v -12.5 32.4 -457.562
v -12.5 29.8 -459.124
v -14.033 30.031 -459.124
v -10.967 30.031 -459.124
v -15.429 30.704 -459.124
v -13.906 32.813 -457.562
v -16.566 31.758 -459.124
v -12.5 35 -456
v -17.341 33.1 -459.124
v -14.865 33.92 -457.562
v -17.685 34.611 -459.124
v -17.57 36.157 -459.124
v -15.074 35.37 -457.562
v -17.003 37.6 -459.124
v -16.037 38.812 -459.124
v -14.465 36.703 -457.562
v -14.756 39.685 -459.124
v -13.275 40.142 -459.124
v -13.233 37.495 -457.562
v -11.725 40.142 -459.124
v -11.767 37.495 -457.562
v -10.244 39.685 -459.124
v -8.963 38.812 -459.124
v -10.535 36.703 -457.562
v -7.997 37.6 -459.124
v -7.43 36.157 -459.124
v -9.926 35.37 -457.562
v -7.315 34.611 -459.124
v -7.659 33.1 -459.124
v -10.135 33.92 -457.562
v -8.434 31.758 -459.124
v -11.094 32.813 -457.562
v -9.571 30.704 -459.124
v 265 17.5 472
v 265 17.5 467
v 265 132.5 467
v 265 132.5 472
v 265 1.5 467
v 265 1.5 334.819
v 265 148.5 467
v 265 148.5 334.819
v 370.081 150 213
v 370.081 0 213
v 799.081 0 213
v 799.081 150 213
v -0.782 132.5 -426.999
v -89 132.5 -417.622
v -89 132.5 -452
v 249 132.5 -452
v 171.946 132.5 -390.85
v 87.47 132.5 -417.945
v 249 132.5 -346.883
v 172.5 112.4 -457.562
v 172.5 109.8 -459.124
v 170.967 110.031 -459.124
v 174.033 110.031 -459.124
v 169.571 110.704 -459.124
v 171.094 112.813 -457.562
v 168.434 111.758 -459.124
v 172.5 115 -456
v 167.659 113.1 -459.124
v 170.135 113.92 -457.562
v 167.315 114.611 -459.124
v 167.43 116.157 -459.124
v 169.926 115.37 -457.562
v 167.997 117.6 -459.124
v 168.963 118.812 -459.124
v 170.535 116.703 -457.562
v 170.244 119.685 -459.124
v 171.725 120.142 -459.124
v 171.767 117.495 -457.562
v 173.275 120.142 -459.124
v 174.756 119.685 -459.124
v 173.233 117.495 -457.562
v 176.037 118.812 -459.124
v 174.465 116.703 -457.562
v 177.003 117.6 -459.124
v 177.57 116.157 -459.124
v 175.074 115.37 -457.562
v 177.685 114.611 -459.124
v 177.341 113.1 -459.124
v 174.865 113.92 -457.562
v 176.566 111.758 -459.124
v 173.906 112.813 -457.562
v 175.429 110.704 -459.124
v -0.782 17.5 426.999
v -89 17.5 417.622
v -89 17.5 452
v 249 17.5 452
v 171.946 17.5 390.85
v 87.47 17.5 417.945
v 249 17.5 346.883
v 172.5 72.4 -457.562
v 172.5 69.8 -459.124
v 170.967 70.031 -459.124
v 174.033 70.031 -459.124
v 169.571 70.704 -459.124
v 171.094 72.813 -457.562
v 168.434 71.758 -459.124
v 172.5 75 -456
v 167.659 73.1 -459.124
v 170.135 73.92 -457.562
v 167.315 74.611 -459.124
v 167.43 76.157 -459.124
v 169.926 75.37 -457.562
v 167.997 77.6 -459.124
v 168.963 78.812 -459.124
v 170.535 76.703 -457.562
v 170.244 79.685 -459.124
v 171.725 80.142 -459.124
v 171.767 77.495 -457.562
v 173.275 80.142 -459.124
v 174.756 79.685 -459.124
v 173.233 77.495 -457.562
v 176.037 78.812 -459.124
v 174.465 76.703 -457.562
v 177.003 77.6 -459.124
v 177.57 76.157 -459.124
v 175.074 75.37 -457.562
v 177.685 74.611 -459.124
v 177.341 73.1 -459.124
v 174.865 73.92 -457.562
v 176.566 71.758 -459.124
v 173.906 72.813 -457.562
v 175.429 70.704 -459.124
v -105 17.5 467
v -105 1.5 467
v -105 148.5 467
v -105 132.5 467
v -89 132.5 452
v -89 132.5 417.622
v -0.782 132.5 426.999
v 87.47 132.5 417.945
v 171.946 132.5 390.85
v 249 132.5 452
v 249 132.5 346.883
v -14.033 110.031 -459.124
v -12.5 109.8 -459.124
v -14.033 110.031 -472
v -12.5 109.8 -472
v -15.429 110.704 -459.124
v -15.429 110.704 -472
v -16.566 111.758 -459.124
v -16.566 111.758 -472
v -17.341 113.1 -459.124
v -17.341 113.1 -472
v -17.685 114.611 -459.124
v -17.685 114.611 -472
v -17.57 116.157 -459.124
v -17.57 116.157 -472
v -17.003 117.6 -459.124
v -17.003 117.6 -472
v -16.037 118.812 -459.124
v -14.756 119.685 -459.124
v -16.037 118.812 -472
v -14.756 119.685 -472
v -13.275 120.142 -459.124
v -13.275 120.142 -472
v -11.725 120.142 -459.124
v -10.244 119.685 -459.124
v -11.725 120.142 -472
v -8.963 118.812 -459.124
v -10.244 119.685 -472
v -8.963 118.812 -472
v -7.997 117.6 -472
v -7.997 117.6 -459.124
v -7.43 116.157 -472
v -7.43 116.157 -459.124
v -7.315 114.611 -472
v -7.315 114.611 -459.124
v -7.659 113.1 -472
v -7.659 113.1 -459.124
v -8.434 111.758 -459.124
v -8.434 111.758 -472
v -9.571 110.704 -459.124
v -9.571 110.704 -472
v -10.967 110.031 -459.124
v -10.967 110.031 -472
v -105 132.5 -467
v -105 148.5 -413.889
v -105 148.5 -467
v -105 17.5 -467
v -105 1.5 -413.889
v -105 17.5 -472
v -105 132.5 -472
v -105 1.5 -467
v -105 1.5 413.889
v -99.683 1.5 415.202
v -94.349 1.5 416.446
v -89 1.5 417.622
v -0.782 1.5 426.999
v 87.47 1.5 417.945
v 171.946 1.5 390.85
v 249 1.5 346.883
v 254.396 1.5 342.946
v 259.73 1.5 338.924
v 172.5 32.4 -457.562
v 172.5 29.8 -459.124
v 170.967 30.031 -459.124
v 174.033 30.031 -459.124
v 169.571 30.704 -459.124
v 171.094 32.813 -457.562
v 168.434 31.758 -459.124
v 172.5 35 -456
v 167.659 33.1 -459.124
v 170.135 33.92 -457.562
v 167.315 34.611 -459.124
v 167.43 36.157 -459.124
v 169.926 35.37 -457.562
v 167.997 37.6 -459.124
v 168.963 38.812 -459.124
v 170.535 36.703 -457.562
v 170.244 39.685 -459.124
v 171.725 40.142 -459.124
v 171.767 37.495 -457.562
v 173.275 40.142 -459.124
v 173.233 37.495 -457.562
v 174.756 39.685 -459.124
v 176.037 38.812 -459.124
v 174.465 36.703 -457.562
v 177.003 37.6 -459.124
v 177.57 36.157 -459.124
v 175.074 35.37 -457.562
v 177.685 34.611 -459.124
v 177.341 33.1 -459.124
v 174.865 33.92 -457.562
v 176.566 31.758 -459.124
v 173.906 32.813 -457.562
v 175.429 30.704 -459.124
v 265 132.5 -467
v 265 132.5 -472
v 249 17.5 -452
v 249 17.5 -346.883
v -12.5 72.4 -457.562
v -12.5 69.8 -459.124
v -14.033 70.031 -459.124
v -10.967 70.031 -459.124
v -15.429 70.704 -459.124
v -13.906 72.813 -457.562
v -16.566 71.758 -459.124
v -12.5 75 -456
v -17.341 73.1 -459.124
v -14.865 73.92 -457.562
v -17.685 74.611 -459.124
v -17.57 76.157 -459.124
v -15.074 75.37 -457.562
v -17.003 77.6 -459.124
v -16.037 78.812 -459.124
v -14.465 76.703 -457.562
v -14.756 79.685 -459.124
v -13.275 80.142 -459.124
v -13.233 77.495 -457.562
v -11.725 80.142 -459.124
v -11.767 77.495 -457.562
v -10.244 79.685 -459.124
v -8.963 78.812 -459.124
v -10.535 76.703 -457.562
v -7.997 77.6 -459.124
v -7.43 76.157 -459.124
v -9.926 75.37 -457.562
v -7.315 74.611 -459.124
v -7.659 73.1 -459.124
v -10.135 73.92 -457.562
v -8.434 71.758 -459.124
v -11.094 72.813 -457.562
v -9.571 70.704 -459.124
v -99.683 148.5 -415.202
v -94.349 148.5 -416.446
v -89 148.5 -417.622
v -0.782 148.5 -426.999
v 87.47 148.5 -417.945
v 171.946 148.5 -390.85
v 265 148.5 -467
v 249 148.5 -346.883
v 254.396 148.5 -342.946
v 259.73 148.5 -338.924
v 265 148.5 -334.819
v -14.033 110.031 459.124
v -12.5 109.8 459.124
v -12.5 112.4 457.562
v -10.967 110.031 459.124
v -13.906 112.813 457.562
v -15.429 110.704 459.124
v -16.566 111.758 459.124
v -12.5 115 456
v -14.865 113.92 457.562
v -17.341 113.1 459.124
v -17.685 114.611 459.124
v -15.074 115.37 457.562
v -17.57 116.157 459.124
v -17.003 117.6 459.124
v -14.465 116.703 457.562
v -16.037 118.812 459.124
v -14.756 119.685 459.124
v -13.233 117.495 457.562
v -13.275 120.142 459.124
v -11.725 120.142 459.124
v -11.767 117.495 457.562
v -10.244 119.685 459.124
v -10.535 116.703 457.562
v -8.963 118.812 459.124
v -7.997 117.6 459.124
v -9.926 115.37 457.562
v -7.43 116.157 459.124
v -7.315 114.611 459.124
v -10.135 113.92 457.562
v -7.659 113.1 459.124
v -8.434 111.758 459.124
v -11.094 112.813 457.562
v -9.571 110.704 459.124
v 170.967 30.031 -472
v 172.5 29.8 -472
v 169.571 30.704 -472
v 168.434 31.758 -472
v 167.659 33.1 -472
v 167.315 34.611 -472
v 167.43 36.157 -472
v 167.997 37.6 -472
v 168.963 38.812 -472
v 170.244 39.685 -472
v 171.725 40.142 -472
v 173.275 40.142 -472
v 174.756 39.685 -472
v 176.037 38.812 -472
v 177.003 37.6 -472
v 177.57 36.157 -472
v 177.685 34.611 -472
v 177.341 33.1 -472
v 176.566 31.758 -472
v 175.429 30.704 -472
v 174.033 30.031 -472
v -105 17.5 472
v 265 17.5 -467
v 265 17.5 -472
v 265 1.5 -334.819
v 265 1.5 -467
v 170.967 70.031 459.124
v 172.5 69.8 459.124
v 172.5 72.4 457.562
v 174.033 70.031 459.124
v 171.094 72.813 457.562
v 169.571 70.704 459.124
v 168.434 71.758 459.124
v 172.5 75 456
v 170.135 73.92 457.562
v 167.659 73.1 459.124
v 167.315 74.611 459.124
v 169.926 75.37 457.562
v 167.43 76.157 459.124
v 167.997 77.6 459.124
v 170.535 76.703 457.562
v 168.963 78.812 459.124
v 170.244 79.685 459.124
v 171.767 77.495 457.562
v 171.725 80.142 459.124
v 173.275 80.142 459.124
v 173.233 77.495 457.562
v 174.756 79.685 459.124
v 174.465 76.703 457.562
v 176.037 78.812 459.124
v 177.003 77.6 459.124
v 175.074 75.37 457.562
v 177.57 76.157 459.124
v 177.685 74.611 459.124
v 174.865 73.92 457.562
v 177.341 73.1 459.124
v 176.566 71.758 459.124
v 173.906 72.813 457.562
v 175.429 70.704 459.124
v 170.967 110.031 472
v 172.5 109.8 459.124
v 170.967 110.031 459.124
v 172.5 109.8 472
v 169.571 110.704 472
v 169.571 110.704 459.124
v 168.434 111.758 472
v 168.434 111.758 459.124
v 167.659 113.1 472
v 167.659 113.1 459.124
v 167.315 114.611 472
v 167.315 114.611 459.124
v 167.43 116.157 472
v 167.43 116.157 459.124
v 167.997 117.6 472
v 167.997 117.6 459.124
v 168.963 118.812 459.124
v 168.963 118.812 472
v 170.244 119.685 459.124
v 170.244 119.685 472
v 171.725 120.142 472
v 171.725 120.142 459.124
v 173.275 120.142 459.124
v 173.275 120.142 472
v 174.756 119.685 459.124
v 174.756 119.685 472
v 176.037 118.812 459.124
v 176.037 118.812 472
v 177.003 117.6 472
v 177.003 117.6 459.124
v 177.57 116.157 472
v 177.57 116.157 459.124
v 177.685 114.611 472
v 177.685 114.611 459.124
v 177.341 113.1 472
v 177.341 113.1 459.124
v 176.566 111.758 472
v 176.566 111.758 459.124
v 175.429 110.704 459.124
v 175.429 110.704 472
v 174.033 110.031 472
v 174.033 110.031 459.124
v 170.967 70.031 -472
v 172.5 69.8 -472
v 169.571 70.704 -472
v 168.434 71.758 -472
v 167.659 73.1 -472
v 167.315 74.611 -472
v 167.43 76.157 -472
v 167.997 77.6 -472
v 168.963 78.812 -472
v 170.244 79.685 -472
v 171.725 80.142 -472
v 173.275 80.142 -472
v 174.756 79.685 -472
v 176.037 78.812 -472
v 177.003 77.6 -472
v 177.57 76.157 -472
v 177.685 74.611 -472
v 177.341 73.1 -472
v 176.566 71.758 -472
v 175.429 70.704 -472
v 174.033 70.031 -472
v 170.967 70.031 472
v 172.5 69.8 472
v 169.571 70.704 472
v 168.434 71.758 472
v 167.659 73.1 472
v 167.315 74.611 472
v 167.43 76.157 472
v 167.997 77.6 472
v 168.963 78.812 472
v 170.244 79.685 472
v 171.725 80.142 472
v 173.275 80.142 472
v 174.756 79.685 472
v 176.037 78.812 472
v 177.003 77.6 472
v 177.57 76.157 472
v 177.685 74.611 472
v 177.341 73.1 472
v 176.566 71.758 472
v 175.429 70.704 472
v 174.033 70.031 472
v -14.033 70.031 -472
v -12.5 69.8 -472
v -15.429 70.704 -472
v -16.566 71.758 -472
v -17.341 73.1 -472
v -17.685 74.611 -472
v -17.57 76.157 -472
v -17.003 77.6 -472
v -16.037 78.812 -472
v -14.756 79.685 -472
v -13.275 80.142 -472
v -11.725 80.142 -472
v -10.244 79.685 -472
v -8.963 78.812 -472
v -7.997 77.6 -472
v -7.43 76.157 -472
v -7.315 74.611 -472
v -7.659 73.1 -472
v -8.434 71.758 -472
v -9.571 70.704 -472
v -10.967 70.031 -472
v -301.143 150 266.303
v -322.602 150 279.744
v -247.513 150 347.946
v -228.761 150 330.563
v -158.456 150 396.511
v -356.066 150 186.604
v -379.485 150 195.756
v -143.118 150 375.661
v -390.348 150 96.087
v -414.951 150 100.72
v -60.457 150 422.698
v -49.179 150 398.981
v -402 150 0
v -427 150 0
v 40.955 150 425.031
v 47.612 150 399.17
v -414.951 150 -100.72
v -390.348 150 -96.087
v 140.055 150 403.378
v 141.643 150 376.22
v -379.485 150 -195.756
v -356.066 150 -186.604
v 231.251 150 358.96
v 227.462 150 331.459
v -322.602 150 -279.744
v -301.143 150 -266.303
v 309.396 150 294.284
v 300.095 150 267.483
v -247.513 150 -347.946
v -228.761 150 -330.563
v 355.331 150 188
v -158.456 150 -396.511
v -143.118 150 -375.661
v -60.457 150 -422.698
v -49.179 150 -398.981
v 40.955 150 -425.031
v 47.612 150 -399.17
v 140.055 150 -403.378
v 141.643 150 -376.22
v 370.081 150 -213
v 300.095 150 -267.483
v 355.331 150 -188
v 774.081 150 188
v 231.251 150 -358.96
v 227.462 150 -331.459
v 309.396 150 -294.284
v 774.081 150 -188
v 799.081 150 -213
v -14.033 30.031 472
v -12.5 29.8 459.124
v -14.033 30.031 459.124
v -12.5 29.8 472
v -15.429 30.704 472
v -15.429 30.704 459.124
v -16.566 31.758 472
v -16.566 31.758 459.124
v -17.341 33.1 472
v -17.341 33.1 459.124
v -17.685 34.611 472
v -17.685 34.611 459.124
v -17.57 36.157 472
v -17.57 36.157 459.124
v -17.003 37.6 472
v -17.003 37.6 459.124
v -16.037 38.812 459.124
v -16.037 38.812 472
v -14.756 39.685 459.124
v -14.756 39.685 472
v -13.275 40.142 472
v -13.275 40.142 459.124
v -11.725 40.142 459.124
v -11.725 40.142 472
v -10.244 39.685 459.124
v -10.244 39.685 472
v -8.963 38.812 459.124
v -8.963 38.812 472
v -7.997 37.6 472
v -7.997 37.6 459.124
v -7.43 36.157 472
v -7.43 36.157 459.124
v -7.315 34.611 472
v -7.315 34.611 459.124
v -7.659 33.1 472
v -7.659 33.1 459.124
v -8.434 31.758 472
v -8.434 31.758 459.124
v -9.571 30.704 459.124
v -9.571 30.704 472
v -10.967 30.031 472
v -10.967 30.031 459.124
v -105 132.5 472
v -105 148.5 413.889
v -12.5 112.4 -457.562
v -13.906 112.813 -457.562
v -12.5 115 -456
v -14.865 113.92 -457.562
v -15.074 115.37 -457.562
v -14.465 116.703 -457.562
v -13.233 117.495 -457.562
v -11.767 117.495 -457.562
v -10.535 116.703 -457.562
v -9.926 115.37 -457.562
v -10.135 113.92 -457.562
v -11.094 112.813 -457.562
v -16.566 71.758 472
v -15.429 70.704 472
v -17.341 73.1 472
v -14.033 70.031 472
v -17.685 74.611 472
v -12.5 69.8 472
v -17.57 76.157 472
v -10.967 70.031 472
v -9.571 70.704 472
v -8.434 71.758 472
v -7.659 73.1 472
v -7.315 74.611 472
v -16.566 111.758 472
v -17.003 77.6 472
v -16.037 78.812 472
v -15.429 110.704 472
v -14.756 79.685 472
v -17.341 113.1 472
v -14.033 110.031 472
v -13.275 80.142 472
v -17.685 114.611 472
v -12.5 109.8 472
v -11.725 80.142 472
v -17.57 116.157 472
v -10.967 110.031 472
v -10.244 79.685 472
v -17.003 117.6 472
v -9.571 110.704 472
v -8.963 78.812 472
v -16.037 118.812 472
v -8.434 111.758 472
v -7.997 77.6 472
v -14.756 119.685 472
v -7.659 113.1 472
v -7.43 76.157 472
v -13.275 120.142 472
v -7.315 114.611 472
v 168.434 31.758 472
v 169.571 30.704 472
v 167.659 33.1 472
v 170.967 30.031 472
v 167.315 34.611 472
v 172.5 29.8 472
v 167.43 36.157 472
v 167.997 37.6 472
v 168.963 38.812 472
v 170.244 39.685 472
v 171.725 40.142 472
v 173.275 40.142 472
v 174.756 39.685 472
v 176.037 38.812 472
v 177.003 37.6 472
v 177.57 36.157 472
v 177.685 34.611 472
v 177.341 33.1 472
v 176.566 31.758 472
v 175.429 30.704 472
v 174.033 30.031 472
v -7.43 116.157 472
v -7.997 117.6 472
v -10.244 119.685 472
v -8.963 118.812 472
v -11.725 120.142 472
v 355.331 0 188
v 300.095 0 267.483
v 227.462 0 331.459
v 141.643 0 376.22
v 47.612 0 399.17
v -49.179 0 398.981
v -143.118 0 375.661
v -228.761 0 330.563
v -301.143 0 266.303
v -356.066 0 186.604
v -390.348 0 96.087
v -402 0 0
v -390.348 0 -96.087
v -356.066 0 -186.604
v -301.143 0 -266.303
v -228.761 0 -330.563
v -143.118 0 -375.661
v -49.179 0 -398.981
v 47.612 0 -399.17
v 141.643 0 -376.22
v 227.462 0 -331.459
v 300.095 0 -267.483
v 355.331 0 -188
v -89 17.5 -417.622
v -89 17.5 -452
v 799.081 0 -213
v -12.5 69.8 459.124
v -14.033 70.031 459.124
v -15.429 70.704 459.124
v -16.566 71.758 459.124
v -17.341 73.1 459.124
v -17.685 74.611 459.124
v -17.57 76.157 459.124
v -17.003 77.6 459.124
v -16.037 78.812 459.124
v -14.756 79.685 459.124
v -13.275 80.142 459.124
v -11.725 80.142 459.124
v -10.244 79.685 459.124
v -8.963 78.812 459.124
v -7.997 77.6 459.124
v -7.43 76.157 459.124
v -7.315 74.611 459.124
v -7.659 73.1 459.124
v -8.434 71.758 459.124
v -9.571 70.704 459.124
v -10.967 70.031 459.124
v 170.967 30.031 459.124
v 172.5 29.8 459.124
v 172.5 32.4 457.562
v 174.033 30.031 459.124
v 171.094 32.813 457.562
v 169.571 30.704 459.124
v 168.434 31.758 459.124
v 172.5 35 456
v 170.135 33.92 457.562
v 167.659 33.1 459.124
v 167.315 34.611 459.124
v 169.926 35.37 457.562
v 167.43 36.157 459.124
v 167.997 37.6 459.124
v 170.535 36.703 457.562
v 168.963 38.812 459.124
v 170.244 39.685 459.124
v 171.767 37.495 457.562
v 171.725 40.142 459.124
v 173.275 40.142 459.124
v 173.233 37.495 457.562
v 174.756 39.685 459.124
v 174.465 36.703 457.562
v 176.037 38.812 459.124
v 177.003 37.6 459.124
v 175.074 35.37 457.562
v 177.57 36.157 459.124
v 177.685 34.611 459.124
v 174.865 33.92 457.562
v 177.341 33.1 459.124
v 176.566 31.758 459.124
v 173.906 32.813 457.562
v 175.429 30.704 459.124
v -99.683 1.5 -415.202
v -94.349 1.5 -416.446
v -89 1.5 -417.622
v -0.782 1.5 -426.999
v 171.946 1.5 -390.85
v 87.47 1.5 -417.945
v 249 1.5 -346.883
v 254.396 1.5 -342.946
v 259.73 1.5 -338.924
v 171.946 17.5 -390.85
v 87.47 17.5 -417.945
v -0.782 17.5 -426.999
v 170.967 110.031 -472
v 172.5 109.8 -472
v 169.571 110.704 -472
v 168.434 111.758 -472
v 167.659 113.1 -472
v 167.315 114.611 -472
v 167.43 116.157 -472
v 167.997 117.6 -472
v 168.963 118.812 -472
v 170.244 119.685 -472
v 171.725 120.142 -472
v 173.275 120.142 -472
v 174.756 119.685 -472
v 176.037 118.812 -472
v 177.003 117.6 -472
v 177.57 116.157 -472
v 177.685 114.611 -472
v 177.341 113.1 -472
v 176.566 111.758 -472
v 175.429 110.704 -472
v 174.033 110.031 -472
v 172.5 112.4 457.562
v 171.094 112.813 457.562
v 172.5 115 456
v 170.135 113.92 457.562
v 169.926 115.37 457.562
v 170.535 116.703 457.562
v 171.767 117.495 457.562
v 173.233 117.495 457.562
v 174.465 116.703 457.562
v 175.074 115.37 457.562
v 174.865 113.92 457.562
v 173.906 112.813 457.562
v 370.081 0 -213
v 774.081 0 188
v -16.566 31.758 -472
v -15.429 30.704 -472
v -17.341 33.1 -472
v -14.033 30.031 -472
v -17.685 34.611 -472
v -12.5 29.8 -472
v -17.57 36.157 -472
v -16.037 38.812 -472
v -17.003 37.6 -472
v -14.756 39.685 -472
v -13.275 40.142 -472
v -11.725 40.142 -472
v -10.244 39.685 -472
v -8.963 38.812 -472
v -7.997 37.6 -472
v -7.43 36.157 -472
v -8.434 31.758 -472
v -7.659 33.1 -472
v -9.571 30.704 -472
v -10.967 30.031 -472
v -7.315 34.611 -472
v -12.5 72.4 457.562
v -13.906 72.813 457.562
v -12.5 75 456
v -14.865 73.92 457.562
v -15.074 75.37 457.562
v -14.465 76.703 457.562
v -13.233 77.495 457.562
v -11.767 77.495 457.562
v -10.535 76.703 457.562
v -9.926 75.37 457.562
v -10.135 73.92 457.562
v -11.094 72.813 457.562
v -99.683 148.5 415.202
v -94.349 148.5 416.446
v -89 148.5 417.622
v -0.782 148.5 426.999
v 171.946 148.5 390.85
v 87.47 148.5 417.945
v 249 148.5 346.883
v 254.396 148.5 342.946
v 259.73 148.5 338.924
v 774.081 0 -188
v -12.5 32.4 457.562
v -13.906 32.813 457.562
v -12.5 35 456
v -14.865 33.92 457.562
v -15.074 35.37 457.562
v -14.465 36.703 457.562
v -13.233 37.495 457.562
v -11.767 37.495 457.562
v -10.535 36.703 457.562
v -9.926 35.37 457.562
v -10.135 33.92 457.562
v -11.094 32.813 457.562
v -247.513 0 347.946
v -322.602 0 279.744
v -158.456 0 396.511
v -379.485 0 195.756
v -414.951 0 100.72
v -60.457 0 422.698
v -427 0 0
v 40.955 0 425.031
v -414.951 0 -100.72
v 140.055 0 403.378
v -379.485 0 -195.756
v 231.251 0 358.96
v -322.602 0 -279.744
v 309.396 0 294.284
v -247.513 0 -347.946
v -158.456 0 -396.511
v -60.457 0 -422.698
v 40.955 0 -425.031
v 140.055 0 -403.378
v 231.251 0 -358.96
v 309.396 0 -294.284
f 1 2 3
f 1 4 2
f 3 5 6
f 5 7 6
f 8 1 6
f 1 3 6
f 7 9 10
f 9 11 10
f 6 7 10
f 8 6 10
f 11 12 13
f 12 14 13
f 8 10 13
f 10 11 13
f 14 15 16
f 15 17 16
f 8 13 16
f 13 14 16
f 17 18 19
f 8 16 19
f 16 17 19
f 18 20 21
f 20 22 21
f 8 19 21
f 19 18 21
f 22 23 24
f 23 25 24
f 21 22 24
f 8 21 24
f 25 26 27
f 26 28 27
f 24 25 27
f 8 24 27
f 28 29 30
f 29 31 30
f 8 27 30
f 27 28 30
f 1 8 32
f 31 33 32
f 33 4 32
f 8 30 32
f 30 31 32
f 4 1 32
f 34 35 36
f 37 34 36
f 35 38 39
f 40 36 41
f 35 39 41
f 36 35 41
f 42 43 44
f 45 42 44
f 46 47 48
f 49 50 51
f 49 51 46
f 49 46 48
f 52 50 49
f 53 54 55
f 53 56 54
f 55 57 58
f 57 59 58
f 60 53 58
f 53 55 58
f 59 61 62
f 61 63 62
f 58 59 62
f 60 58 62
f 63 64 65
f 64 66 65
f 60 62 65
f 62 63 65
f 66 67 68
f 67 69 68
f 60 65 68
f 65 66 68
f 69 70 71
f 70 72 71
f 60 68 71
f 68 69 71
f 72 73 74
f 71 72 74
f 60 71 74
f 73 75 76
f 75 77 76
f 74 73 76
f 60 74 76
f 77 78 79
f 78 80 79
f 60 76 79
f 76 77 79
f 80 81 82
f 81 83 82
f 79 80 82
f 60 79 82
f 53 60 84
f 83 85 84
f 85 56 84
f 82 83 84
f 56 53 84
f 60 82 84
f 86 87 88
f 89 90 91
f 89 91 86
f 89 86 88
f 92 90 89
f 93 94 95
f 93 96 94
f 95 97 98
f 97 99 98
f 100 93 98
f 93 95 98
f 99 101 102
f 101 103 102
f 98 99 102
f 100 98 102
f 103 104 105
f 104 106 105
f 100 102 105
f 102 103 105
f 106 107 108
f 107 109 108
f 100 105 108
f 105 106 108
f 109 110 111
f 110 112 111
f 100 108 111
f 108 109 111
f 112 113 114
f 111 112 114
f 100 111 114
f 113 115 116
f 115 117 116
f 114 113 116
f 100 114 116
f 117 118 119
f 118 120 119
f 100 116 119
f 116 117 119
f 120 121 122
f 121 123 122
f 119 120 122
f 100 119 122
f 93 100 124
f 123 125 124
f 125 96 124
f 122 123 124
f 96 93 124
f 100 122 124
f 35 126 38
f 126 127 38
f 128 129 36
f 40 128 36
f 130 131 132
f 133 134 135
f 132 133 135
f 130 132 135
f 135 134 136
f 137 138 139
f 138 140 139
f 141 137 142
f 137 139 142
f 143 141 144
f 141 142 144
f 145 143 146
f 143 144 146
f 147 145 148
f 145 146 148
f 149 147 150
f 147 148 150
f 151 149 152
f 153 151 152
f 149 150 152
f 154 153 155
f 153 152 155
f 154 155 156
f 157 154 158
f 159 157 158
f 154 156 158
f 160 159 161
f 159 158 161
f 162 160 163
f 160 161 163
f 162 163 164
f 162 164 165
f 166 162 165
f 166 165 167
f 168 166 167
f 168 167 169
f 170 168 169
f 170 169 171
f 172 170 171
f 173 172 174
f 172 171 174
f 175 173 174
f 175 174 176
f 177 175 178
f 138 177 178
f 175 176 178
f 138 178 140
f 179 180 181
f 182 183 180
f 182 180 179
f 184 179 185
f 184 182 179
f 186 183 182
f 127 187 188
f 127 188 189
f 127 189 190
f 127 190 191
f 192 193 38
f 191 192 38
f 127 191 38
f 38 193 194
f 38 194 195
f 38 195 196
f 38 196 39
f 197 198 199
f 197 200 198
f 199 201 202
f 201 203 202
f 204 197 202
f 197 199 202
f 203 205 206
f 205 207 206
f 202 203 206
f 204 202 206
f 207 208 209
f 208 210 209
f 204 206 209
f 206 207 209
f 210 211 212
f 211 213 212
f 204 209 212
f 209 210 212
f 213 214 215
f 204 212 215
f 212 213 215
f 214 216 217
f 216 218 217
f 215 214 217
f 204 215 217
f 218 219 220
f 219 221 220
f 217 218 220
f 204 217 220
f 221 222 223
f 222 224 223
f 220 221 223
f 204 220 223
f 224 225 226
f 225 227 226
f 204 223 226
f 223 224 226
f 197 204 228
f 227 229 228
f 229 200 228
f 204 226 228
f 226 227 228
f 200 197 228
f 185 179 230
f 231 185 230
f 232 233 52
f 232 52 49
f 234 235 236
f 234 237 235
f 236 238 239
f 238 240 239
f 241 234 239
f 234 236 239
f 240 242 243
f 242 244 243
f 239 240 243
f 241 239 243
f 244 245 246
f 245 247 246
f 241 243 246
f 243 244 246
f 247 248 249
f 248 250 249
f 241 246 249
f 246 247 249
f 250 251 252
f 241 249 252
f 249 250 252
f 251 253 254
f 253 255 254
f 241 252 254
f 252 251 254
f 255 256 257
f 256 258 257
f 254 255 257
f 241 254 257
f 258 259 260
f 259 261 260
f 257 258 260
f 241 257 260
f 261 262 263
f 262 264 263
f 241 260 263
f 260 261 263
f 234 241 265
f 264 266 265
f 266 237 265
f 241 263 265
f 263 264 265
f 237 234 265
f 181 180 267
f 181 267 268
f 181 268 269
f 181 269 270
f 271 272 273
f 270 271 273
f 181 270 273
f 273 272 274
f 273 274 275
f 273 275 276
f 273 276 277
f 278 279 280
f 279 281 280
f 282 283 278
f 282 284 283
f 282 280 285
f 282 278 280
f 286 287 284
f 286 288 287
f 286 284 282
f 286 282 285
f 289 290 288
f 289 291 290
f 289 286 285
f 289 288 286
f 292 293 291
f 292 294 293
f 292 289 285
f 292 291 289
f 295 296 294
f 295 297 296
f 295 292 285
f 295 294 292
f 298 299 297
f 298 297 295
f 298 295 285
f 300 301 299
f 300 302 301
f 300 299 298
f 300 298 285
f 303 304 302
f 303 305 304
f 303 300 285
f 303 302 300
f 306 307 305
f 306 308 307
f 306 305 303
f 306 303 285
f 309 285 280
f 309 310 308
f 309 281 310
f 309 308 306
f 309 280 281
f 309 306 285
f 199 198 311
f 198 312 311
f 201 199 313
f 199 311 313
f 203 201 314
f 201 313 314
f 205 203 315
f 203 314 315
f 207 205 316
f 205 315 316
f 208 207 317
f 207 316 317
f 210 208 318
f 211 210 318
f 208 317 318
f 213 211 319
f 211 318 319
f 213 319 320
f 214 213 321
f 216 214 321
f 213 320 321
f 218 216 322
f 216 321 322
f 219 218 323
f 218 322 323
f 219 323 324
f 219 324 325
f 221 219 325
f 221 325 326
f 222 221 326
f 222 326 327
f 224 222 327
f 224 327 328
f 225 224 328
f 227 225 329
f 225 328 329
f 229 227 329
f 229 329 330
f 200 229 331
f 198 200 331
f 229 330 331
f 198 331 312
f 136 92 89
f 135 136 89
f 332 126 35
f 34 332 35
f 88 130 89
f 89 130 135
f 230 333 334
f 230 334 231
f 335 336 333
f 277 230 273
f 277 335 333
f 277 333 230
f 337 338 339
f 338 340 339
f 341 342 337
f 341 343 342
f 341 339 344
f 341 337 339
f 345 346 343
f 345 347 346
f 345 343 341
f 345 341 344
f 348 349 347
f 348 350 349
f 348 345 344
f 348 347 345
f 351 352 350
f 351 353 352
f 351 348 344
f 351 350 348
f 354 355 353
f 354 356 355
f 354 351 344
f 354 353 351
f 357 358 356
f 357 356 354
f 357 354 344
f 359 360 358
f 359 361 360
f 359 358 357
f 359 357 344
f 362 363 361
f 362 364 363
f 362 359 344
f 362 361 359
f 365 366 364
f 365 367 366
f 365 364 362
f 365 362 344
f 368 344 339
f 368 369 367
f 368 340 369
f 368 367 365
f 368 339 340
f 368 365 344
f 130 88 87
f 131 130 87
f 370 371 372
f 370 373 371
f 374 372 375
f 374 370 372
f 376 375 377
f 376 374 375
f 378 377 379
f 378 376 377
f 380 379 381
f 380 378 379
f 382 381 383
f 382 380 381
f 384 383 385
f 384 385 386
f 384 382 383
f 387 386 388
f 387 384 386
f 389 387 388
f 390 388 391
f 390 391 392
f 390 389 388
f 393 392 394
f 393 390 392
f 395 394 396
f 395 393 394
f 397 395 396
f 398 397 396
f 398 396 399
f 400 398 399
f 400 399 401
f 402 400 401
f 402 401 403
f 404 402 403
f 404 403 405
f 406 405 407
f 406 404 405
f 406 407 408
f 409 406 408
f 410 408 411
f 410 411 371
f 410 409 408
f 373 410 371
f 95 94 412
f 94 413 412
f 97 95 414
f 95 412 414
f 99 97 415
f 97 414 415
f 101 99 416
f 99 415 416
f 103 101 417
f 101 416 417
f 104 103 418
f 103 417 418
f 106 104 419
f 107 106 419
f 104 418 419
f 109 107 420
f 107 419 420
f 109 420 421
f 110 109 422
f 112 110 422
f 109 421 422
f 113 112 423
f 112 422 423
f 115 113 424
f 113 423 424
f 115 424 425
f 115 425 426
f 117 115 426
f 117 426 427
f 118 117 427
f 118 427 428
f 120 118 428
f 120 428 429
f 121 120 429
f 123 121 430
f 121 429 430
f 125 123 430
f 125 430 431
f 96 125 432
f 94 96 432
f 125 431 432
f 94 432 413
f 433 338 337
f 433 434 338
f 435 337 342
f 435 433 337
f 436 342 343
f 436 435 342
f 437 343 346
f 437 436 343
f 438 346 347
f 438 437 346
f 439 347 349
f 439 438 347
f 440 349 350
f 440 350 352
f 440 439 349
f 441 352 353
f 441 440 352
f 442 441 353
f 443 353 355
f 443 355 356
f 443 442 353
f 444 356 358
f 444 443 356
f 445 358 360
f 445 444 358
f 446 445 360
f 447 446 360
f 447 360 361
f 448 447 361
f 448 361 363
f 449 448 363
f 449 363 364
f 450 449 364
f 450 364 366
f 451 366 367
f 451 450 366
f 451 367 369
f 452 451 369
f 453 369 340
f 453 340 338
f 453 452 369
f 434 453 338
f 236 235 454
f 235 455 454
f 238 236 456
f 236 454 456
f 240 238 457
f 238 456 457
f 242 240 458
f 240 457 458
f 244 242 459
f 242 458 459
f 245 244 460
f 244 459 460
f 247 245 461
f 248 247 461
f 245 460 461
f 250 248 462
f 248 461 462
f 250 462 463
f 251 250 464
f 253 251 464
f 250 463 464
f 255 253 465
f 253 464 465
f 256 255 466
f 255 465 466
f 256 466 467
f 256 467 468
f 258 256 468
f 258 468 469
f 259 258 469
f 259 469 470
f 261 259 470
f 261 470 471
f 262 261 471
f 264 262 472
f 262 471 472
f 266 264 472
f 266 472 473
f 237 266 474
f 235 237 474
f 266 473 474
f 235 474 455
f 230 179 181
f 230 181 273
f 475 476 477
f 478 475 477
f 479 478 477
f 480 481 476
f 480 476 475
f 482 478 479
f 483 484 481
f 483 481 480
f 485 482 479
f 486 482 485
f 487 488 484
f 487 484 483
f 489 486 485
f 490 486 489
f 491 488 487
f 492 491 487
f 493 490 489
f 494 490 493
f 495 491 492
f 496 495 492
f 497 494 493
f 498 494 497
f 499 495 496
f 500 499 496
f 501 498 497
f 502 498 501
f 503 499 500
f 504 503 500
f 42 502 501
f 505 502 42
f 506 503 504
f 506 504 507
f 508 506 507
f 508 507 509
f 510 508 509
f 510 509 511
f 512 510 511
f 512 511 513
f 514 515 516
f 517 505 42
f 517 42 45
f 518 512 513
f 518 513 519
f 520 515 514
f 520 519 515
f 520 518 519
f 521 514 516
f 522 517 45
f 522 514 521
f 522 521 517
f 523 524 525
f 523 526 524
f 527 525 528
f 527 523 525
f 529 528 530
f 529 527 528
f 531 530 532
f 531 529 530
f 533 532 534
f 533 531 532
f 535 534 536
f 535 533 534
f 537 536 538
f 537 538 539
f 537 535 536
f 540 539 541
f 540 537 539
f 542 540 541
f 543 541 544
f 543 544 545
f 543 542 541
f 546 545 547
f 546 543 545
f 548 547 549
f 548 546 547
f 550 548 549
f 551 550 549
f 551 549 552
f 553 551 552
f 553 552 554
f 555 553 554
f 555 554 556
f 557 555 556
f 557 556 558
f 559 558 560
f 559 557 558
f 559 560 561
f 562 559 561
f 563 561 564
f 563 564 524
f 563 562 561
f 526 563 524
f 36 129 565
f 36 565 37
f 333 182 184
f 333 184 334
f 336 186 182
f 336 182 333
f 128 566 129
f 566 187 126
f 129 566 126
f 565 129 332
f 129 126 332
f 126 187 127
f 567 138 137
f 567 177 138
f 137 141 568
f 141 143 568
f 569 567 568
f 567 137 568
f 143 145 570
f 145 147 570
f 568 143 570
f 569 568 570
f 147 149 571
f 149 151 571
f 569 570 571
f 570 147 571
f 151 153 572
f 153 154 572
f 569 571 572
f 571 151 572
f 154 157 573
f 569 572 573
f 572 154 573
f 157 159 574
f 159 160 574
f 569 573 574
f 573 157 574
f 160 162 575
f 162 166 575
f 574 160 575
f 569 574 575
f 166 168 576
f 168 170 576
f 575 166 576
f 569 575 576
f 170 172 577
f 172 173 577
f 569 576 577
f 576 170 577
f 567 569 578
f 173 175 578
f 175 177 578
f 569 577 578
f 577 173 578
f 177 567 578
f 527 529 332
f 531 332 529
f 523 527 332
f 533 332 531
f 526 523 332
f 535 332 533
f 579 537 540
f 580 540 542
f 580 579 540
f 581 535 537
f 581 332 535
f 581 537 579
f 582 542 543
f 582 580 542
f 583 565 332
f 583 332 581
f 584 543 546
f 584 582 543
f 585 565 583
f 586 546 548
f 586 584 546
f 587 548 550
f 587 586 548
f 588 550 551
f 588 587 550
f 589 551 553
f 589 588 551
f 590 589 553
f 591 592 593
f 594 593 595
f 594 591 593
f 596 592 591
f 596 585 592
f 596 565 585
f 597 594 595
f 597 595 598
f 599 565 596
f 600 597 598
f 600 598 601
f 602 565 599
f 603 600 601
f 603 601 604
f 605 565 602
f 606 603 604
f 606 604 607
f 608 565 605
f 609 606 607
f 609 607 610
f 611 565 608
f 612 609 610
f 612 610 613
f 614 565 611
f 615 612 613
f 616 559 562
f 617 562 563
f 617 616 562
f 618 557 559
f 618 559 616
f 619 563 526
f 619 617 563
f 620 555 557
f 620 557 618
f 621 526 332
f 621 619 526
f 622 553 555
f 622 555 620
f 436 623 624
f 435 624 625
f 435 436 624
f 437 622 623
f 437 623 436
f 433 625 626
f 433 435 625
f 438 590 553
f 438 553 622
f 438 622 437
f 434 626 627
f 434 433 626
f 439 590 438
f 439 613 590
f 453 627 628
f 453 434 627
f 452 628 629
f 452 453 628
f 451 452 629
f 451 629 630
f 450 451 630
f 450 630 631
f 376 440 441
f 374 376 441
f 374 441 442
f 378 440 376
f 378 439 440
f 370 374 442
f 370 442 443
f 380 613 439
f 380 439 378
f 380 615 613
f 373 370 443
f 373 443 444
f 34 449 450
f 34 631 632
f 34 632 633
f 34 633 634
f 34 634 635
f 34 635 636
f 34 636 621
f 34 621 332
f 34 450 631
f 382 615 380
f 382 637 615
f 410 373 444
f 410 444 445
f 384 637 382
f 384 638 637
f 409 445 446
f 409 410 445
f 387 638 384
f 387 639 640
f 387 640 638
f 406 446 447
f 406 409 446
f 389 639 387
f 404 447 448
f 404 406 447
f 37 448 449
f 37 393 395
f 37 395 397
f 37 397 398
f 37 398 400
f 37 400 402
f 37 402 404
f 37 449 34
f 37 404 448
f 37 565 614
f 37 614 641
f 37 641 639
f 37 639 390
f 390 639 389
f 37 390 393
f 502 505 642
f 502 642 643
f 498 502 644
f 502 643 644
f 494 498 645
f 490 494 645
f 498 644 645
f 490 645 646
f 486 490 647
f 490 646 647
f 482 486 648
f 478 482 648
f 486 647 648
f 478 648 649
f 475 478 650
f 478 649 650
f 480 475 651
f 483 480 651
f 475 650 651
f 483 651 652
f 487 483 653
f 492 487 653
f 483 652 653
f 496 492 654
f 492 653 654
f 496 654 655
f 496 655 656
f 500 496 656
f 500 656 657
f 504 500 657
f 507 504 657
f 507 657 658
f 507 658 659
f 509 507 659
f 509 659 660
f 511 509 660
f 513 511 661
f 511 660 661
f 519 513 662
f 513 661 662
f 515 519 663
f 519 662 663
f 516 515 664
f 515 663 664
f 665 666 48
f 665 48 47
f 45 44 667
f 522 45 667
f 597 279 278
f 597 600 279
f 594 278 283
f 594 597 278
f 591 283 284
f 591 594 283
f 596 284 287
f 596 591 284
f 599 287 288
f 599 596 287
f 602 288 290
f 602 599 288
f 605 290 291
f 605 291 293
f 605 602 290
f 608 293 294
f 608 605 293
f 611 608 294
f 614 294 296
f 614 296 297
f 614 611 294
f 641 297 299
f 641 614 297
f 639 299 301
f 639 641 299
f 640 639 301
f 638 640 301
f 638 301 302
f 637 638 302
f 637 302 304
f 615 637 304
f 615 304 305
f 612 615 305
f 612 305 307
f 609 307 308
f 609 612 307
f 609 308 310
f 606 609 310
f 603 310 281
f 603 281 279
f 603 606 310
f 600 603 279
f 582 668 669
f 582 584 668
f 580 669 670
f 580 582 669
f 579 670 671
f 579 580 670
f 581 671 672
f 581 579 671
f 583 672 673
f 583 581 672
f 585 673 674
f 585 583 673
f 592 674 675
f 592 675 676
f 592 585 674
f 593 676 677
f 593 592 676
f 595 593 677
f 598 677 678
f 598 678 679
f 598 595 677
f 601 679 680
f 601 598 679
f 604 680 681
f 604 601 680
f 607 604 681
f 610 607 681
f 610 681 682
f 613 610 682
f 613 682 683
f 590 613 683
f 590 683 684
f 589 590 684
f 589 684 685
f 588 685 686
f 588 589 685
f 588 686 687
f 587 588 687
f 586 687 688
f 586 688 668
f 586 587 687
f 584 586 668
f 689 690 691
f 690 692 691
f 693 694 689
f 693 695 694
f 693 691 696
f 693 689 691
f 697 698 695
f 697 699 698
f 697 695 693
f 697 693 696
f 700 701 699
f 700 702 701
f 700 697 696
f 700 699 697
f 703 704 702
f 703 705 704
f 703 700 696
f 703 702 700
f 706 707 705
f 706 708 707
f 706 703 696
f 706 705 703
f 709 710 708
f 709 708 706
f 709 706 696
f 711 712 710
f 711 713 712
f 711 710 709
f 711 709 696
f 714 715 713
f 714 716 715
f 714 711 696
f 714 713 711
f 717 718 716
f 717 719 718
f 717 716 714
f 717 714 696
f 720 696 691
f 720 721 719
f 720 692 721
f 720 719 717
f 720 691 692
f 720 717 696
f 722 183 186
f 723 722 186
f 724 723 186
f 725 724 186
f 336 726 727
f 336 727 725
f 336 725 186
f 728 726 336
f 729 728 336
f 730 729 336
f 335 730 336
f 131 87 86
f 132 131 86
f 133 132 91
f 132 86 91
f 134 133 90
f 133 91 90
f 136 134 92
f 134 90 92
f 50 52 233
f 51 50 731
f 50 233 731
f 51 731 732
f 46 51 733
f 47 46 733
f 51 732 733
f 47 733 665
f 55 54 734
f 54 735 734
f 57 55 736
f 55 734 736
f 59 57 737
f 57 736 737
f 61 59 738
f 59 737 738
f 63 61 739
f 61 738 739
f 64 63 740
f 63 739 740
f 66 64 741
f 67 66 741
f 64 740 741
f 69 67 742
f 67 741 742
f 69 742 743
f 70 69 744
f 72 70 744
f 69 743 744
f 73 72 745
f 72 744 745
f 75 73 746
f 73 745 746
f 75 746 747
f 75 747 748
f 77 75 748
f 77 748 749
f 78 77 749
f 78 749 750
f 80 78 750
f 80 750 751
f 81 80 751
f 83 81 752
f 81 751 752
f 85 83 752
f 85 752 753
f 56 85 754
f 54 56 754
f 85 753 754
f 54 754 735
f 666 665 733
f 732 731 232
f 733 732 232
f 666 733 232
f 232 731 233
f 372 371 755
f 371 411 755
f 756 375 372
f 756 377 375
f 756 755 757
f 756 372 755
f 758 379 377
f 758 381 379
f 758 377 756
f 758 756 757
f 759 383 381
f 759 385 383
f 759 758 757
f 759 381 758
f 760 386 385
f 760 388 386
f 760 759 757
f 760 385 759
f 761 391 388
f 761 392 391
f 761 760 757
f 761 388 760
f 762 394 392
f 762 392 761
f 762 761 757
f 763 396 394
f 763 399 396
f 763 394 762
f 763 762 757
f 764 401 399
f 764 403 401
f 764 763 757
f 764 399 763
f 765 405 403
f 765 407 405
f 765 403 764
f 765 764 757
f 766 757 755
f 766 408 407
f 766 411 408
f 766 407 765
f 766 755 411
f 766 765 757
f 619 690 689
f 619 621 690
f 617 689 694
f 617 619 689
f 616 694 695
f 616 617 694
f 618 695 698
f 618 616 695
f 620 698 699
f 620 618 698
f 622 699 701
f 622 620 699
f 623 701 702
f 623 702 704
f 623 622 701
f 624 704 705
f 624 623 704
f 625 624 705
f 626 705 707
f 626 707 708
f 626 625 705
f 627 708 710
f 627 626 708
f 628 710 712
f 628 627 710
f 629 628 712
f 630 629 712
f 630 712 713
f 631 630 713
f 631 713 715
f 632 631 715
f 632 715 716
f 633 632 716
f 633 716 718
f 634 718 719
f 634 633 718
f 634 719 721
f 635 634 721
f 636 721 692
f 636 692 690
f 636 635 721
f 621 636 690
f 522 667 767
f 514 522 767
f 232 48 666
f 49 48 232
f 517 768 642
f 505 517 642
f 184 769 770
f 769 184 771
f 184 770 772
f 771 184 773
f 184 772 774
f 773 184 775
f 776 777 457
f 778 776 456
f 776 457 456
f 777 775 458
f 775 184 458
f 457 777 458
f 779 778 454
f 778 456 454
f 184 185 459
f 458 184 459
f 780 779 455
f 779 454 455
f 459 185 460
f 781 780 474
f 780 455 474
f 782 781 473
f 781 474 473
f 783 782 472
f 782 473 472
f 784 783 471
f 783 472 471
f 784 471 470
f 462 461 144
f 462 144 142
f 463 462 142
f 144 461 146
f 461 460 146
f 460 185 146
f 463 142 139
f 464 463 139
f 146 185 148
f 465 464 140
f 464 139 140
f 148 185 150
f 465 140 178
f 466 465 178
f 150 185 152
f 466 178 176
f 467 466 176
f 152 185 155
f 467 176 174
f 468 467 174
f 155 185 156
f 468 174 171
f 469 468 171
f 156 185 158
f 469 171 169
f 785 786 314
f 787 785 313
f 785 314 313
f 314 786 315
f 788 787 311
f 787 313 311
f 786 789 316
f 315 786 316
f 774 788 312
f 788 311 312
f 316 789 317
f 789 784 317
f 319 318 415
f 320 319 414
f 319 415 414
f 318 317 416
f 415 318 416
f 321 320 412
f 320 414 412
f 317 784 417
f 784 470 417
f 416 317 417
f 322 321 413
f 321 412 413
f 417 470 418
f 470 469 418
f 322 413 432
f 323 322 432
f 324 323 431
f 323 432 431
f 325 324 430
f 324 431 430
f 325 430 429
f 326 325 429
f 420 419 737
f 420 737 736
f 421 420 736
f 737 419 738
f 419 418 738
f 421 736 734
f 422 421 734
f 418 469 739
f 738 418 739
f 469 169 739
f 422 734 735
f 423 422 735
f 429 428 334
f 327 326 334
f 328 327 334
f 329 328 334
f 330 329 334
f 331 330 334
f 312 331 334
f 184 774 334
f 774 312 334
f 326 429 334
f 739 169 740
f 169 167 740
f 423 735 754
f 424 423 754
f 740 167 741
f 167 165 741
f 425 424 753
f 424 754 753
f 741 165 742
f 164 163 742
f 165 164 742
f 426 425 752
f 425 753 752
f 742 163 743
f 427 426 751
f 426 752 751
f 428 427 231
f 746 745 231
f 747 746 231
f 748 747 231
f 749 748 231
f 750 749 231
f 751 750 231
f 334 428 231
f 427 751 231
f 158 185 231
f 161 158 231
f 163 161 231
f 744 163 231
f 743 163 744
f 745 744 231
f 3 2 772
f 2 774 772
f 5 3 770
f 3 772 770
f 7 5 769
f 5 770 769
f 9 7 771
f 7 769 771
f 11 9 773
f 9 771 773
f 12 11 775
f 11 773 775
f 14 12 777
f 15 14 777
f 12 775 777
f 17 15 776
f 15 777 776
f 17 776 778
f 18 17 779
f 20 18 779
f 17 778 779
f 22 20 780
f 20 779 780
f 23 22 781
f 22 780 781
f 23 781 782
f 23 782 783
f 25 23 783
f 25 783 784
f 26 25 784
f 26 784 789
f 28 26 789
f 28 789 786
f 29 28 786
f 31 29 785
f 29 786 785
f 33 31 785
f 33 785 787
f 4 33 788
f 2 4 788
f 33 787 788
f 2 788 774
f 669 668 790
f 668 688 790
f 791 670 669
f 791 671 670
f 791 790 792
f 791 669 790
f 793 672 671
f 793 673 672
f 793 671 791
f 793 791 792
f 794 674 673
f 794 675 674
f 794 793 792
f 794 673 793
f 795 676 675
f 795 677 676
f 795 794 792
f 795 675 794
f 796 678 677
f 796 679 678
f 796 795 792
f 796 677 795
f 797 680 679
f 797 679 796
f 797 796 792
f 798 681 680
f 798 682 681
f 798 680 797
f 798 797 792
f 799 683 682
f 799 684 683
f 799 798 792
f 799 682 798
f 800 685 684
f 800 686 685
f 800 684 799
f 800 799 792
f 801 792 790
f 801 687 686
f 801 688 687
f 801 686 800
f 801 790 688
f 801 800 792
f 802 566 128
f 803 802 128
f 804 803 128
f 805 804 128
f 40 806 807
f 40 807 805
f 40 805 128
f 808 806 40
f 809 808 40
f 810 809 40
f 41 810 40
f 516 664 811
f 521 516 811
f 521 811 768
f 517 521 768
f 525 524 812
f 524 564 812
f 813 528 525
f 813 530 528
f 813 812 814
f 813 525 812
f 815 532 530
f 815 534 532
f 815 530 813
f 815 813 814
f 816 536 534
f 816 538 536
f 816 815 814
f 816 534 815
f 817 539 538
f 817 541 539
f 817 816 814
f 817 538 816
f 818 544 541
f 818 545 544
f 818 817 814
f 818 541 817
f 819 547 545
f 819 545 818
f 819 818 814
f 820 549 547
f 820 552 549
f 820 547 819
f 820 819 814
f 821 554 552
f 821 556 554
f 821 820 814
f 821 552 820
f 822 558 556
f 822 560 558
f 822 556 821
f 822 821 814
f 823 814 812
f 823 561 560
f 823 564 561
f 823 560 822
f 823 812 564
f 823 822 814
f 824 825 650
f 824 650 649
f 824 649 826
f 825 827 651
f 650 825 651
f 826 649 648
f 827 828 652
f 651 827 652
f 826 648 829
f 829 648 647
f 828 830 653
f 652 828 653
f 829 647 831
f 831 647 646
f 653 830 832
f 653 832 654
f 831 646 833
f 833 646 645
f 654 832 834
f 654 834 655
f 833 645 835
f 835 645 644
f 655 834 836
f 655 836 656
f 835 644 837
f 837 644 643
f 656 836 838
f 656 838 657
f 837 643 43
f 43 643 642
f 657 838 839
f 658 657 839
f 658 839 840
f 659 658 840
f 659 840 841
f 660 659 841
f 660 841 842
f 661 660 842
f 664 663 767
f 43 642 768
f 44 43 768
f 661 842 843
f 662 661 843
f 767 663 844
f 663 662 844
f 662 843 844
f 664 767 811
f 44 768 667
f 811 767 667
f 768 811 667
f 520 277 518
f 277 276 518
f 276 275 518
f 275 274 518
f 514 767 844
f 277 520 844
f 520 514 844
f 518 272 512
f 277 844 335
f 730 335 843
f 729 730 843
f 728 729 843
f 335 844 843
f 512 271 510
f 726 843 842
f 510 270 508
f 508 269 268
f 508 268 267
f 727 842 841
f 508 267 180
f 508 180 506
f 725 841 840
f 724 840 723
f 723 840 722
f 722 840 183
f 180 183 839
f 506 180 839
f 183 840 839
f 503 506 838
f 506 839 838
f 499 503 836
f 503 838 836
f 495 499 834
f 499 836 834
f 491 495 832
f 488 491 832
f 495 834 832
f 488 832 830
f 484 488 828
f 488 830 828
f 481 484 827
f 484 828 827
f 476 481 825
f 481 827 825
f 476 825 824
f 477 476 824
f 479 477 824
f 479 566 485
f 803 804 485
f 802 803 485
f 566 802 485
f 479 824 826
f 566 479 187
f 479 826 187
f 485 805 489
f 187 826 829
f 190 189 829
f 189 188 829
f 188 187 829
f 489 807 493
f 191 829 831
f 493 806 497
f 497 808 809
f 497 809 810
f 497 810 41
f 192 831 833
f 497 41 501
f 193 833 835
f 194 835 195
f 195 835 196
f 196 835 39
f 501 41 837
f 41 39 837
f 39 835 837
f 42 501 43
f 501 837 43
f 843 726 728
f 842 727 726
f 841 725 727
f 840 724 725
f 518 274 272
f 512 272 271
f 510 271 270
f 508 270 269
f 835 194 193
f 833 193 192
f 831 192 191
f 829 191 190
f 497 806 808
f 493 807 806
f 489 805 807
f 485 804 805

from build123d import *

# Parameters (mm, degrees)
BOSS_EXTRUDE1_DEPTH               = 150
BOSS_EXTRUDE2_START               = 1.5
BOSS_EXTRUDE2_DEPTH               = 147
BOSS_EXTRUDE2_2_DEPTH             = 16
BOSS_EXTRUDE2_START_2             = 132.5
BOSS_EXTRUDE2_3_DEPTH             = 16
BOSS_EXTRUDE3_START               = -15
SKETCH3_W                         = 370
SKETCH3_H                         = 115
BOSS_EXTRUDE3_DEPTH               = 20
TAP_DRILL_FOR_M12_TAP1_AT_2_COUNT = 2
TAP_DRILL_FOR_M12_TAP1_AT_2_PITCH = 80
TAP_DRILL_FOR_M12_TAP1_AT_3_COUNT = 2
TAP_DRILL_FOR_M12_TAP1_AT_3_PITCH = 185
TAP_DRILL_FOR_M12_TAP1_AT_4_COUNT = 2
TAP_DRILL_FOR_M12_TAP1_AT_4_PITCH = 201.556443707
TAP_DRILL_FOR_M12_TAP1_AT_5_COUNT = 2
TAP_DRILL_FOR_M12_TAP1_AT_5_PITCH = 189.274932307
TAP_DRILL_FOR_M12_TAP1_AT_6_COUNT = 2
TAP_DRILL_FOR_M12_TAP1_AT_6_PITCH = 40


# Read off the part's stored shape, not the designer's step: Boss-Extrude2
with BuildPart() as part:
    # Sketch1 → Boss-Extrude1 (new body)
    with BuildSketch(Plane(origin=(0, 0, 0), x_dir=(1, 0, 0), z_dir=(0, 1, 0))):
        with BuildLine():
            Line((799.081072199, 213), (370.081072199, 213))
            ThreePointArc((370.081072199, 213), (-427, 0), (370.081072199, -213))
            Line((370.081072199, -213), (799.081072199, -213))
            Line((799.081072199, -213), (799.081072199, 213))
        make_face()
        with BuildLine():
            Line((355.330831761, 188), (774.081072199, 188))
            Line((774.081072199, 188), (774.081072199, -188))
            Line((774.081072199, -188), (355.330831761, -188))
            ThreePointArc((355.330831761, -188), (-402, 0), (355.330831761, 188))
        make_face(mode=Mode.SUBTRACT)
    extrude(amount=BOSS_EXTRUDE1_DEPTH)

    # Boss-Extrude2 outline → Boss-Extrude2 (add)
    with BuildSketch(Plane(origin=(0, 0, 0), x_dir=(1, 0, 0), z_dir=(0, 1, 0)).offset(BOSS_EXTRUDE2_START)):
        with BuildLine():
            Line((249, -467), (265, -467))
            Line((265, -467), (265, -334.819354279))
            ThreePointArc((265, -334.819354279), (257.070777199, -340.945179626), (249, -346.883265667))
            Line((249, -346.883265667), (249, -467))
        make_face()
        with BuildLine():
            Line((-105, -467), (-89, -467))
            Line((-89, -467), (-89, -417.621838509))
            ThreePointArc((-89, -417.621838509), (-97.017955844, -415.83231746), (-105, -413.888873975))
            Line((-105, -413.888873975), (-105, -467))
        make_face()
    boss_extrude2 = extrude(amount=BOSS_EXTRUDE2_DEPTH)

    # Boss-Extrude2 2 outline → Boss-Extrude2 2 (add)
    with BuildSketch(Plane(origin=(0, 0, 0), x_dir=(1, 0, 0), z_dir=(0, 1, 0)).offset(BOSS_EXTRUDE2_START)):
        with BuildLine():
            Line((-89, -467), (249, -467))
            Line((249, -467), (249, -346.883265667))
            ThreePointArc((249, -346.883265667), (87.46991724, -417.944988698), (-89, -417.621838509))
            Line((-89, -417.621838509), (-89, -467))
        make_face()
    boss_extrude2_2 = extrude(amount=BOSS_EXTRUDE2_2_DEPTH)

    # Boss-Extrude2 3 outline → Boss-Extrude2 3 (add)
    with BuildSketch(Plane(origin=(0, 0, 0), x_dir=(1, 0, 0), z_dir=(0, 1, 0)).offset(BOSS_EXTRUDE2_START_2)):
        with BuildLine():
            Line((-89, -467), (249, -467))
            Line((249, -467), (249, -346.883265667))
            ThreePointArc((249, -346.883265667), (87.46991724, -417.944988698), (-89, -417.621838509))
            Line((-89, -417.621838509), (-89, -467))
        make_face()
    boss_extrude2_3 = extrude(amount=BOSS_EXTRUDE2_3_DEPTH)

    # Sketch3 → Boss-Extrude3 (add)
    with BuildSketch(Plane.XY.offset(467).offset(BOSS_EXTRUDE3_START)):
        with Locations((80, 75)):
            Rectangle(SKETCH3_W, SKETCH3_H)
    boss_extrude3 = extrude(amount=BOSS_EXTRUDE3_DEPTH)

    # Sketch7 → Tap Drill for M12 Tap1 (revolve, cut)
    with BuildSketch(Plane(origin=(172.5, 115, 472), x_dir=(0, -1, 0), z_dir=(1, 0, 0))):
        Polygon((0, 0), (0, 16), (5.2, 12.875524781), (5.2, 0), align=None)
    tap_drill_for_m12_tap1 = revolve(axis=Axis((172.5, 115, 478.35), (0, 0, -1)), mode=Mode.SUBTRACT)

    # Tap Drill for M12 Tap1 at 2: Tap Drill for M12 Tap1 ×2
    with Locations(*[(0, -i * TAP_DRILL_FOR_M12_TAP1_AT_2_PITCH, 0) for i in range(1, TAP_DRILL_FOR_M12_TAP1_AT_2_COUNT)]):
        add(tap_drill_for_m12_tap1, mode=Mode.SUBTRACT)

    # Tap Drill for M12 Tap1 at 3: Tap Drill for M12 Tap1 ×2
    with Locations(*[(-i * TAP_DRILL_FOR_M12_TAP1_AT_3_PITCH, 0, 0) for i in range(1, TAP_DRILL_FOR_M12_TAP1_AT_3_COUNT)]):
        add(tap_drill_for_m12_tap1, mode=Mode.SUBTRACT)

    # Tap Drill for M12 Tap1 at 4: Tap Drill for M12 Tap1 ×2
    with Locations(*[Vector(-0.9178570359601427, -0.3969111506854671, 0) * (i * TAP_DRILL_FOR_M12_TAP1_AT_4_PITCH) for i in range(1, TAP_DRILL_FOR_M12_TAP1_AT_4_COUNT)]):
        add(tap_drill_for_m12_tap1, mode=Mode.SUBTRACT)

    # Tap Drill for M12 Tap1 at 5: Tap Drill for M12 Tap1 ×2
    with Locations(*[Vector(-0.9774141654398674, -0.21133279252753864, 0) * (i * TAP_DRILL_FOR_M12_TAP1_AT_5_PITCH) for i in range(1, TAP_DRILL_FOR_M12_TAP1_AT_5_COUNT)]):
        add(tap_drill_for_m12_tap1, mode=Mode.SUBTRACT)

    # Tap Drill for M12 Tap1 at 6: Tap Drill for M12 Tap1 ×2
    with Locations(*[(0, -i * TAP_DRILL_FOR_M12_TAP1_AT_6_PITCH, 0) for i in range(1, TAP_DRILL_FOR_M12_TAP1_AT_6_COUNT)]):
        add(tap_drill_for_m12_tap1, mode=Mode.SUBTRACT)

    # Mirror1: Boss-Extrude2, Boss-Extrude2 2, Boss-Extrude2 3, Boss-Extrude3, Tap Drill for M12 Tap1 across plane
    add(boss_extrude2.mirror(Plane.XY))
    add(boss_extrude2_2.mirror(Plane.XY))
    add(boss_extrude2_3.mirror(Plane.XY))
    add(boss_extrude3.mirror(Plane.XY))
    add(tap_drill_for_m12_tap1.mirror(Plane.XY), mode=Mode.SUBTRACT)

    # Mirror1 copy 1 sketch → Mirror1 copy 1 (revolve, cut)
    with BuildSketch(Plane(origin=(172.5, 35, -472), x_dir=(0, -1, 0), z_dir=(1, 0, 0))):
        Polygon((0, 0), (0, -16), (5.2, -12.875524781), (5.2, 0), align=None)
    revolve(axis=Axis((172.5, 35, -478.35), (0, 0, -1)), mode=Mode.SUBTRACT)

    # Mirror1 copy 2 sketch → Mirror1 copy 2 (revolve, cut)
    with BuildSketch(Plane(origin=(-12.5, 115, -472), x_dir=(0, -1, 0), z_dir=(1, 0, 0))):
        Polygon((0, 0), (0, -16), (5.2, -12.875524781), (5.2, 0), align=None)
    revolve(axis=Axis((-12.5, 115, -478.35), (0, 0, -1)), mode=Mode.SUBTRACT)

    # Mirror1 copy 3 sketch → Mirror1 copy 3 (revolve, cut)
    with BuildSketch(Plane(origin=(-12.5, 35, -472), x_dir=(0, -1, 0), z_dir=(1, 0, 0))):
        Polygon((0, 0), (0, -16), (5.2, -12.875524781), (5.2, 0), align=None)
    revolve(axis=Axis((-12.5, 35, -478.35), (0, 0, -1)), mode=Mode.SUBTRACT)

    # Mirror1 copy 4 sketch → Mirror1 copy 4 (revolve, cut)
    with BuildSketch(Plane(origin=(-12.5, 75, -472), x_dir=(0, -1, 0), z_dir=(1, 0, 0))):
        Polygon((0, 0), (0, -16), (5.2, -12.875524781), (5.2, 0), align=None)
    revolve(axis=Axis((-12.5, 75, -478.35), (0, 0, -1)), mode=Mode.SUBTRACT)

    # Mirror1 copy 5 sketch → Mirror1 copy 5 (revolve, cut)
    with BuildSketch(Plane(origin=(172.5, 75, -472), x_dir=(0, -1, 0), z_dir=(1, 0, 0))):
        Polygon((0, 0), (0, -16), (5.2, -12.875524781), (5.2, 0), align=None)
    revolve(axis=Axis((172.5, 75, -478.35), (0, 0, -1)), mode=Mode.SUBTRACT)


solid = part.part
